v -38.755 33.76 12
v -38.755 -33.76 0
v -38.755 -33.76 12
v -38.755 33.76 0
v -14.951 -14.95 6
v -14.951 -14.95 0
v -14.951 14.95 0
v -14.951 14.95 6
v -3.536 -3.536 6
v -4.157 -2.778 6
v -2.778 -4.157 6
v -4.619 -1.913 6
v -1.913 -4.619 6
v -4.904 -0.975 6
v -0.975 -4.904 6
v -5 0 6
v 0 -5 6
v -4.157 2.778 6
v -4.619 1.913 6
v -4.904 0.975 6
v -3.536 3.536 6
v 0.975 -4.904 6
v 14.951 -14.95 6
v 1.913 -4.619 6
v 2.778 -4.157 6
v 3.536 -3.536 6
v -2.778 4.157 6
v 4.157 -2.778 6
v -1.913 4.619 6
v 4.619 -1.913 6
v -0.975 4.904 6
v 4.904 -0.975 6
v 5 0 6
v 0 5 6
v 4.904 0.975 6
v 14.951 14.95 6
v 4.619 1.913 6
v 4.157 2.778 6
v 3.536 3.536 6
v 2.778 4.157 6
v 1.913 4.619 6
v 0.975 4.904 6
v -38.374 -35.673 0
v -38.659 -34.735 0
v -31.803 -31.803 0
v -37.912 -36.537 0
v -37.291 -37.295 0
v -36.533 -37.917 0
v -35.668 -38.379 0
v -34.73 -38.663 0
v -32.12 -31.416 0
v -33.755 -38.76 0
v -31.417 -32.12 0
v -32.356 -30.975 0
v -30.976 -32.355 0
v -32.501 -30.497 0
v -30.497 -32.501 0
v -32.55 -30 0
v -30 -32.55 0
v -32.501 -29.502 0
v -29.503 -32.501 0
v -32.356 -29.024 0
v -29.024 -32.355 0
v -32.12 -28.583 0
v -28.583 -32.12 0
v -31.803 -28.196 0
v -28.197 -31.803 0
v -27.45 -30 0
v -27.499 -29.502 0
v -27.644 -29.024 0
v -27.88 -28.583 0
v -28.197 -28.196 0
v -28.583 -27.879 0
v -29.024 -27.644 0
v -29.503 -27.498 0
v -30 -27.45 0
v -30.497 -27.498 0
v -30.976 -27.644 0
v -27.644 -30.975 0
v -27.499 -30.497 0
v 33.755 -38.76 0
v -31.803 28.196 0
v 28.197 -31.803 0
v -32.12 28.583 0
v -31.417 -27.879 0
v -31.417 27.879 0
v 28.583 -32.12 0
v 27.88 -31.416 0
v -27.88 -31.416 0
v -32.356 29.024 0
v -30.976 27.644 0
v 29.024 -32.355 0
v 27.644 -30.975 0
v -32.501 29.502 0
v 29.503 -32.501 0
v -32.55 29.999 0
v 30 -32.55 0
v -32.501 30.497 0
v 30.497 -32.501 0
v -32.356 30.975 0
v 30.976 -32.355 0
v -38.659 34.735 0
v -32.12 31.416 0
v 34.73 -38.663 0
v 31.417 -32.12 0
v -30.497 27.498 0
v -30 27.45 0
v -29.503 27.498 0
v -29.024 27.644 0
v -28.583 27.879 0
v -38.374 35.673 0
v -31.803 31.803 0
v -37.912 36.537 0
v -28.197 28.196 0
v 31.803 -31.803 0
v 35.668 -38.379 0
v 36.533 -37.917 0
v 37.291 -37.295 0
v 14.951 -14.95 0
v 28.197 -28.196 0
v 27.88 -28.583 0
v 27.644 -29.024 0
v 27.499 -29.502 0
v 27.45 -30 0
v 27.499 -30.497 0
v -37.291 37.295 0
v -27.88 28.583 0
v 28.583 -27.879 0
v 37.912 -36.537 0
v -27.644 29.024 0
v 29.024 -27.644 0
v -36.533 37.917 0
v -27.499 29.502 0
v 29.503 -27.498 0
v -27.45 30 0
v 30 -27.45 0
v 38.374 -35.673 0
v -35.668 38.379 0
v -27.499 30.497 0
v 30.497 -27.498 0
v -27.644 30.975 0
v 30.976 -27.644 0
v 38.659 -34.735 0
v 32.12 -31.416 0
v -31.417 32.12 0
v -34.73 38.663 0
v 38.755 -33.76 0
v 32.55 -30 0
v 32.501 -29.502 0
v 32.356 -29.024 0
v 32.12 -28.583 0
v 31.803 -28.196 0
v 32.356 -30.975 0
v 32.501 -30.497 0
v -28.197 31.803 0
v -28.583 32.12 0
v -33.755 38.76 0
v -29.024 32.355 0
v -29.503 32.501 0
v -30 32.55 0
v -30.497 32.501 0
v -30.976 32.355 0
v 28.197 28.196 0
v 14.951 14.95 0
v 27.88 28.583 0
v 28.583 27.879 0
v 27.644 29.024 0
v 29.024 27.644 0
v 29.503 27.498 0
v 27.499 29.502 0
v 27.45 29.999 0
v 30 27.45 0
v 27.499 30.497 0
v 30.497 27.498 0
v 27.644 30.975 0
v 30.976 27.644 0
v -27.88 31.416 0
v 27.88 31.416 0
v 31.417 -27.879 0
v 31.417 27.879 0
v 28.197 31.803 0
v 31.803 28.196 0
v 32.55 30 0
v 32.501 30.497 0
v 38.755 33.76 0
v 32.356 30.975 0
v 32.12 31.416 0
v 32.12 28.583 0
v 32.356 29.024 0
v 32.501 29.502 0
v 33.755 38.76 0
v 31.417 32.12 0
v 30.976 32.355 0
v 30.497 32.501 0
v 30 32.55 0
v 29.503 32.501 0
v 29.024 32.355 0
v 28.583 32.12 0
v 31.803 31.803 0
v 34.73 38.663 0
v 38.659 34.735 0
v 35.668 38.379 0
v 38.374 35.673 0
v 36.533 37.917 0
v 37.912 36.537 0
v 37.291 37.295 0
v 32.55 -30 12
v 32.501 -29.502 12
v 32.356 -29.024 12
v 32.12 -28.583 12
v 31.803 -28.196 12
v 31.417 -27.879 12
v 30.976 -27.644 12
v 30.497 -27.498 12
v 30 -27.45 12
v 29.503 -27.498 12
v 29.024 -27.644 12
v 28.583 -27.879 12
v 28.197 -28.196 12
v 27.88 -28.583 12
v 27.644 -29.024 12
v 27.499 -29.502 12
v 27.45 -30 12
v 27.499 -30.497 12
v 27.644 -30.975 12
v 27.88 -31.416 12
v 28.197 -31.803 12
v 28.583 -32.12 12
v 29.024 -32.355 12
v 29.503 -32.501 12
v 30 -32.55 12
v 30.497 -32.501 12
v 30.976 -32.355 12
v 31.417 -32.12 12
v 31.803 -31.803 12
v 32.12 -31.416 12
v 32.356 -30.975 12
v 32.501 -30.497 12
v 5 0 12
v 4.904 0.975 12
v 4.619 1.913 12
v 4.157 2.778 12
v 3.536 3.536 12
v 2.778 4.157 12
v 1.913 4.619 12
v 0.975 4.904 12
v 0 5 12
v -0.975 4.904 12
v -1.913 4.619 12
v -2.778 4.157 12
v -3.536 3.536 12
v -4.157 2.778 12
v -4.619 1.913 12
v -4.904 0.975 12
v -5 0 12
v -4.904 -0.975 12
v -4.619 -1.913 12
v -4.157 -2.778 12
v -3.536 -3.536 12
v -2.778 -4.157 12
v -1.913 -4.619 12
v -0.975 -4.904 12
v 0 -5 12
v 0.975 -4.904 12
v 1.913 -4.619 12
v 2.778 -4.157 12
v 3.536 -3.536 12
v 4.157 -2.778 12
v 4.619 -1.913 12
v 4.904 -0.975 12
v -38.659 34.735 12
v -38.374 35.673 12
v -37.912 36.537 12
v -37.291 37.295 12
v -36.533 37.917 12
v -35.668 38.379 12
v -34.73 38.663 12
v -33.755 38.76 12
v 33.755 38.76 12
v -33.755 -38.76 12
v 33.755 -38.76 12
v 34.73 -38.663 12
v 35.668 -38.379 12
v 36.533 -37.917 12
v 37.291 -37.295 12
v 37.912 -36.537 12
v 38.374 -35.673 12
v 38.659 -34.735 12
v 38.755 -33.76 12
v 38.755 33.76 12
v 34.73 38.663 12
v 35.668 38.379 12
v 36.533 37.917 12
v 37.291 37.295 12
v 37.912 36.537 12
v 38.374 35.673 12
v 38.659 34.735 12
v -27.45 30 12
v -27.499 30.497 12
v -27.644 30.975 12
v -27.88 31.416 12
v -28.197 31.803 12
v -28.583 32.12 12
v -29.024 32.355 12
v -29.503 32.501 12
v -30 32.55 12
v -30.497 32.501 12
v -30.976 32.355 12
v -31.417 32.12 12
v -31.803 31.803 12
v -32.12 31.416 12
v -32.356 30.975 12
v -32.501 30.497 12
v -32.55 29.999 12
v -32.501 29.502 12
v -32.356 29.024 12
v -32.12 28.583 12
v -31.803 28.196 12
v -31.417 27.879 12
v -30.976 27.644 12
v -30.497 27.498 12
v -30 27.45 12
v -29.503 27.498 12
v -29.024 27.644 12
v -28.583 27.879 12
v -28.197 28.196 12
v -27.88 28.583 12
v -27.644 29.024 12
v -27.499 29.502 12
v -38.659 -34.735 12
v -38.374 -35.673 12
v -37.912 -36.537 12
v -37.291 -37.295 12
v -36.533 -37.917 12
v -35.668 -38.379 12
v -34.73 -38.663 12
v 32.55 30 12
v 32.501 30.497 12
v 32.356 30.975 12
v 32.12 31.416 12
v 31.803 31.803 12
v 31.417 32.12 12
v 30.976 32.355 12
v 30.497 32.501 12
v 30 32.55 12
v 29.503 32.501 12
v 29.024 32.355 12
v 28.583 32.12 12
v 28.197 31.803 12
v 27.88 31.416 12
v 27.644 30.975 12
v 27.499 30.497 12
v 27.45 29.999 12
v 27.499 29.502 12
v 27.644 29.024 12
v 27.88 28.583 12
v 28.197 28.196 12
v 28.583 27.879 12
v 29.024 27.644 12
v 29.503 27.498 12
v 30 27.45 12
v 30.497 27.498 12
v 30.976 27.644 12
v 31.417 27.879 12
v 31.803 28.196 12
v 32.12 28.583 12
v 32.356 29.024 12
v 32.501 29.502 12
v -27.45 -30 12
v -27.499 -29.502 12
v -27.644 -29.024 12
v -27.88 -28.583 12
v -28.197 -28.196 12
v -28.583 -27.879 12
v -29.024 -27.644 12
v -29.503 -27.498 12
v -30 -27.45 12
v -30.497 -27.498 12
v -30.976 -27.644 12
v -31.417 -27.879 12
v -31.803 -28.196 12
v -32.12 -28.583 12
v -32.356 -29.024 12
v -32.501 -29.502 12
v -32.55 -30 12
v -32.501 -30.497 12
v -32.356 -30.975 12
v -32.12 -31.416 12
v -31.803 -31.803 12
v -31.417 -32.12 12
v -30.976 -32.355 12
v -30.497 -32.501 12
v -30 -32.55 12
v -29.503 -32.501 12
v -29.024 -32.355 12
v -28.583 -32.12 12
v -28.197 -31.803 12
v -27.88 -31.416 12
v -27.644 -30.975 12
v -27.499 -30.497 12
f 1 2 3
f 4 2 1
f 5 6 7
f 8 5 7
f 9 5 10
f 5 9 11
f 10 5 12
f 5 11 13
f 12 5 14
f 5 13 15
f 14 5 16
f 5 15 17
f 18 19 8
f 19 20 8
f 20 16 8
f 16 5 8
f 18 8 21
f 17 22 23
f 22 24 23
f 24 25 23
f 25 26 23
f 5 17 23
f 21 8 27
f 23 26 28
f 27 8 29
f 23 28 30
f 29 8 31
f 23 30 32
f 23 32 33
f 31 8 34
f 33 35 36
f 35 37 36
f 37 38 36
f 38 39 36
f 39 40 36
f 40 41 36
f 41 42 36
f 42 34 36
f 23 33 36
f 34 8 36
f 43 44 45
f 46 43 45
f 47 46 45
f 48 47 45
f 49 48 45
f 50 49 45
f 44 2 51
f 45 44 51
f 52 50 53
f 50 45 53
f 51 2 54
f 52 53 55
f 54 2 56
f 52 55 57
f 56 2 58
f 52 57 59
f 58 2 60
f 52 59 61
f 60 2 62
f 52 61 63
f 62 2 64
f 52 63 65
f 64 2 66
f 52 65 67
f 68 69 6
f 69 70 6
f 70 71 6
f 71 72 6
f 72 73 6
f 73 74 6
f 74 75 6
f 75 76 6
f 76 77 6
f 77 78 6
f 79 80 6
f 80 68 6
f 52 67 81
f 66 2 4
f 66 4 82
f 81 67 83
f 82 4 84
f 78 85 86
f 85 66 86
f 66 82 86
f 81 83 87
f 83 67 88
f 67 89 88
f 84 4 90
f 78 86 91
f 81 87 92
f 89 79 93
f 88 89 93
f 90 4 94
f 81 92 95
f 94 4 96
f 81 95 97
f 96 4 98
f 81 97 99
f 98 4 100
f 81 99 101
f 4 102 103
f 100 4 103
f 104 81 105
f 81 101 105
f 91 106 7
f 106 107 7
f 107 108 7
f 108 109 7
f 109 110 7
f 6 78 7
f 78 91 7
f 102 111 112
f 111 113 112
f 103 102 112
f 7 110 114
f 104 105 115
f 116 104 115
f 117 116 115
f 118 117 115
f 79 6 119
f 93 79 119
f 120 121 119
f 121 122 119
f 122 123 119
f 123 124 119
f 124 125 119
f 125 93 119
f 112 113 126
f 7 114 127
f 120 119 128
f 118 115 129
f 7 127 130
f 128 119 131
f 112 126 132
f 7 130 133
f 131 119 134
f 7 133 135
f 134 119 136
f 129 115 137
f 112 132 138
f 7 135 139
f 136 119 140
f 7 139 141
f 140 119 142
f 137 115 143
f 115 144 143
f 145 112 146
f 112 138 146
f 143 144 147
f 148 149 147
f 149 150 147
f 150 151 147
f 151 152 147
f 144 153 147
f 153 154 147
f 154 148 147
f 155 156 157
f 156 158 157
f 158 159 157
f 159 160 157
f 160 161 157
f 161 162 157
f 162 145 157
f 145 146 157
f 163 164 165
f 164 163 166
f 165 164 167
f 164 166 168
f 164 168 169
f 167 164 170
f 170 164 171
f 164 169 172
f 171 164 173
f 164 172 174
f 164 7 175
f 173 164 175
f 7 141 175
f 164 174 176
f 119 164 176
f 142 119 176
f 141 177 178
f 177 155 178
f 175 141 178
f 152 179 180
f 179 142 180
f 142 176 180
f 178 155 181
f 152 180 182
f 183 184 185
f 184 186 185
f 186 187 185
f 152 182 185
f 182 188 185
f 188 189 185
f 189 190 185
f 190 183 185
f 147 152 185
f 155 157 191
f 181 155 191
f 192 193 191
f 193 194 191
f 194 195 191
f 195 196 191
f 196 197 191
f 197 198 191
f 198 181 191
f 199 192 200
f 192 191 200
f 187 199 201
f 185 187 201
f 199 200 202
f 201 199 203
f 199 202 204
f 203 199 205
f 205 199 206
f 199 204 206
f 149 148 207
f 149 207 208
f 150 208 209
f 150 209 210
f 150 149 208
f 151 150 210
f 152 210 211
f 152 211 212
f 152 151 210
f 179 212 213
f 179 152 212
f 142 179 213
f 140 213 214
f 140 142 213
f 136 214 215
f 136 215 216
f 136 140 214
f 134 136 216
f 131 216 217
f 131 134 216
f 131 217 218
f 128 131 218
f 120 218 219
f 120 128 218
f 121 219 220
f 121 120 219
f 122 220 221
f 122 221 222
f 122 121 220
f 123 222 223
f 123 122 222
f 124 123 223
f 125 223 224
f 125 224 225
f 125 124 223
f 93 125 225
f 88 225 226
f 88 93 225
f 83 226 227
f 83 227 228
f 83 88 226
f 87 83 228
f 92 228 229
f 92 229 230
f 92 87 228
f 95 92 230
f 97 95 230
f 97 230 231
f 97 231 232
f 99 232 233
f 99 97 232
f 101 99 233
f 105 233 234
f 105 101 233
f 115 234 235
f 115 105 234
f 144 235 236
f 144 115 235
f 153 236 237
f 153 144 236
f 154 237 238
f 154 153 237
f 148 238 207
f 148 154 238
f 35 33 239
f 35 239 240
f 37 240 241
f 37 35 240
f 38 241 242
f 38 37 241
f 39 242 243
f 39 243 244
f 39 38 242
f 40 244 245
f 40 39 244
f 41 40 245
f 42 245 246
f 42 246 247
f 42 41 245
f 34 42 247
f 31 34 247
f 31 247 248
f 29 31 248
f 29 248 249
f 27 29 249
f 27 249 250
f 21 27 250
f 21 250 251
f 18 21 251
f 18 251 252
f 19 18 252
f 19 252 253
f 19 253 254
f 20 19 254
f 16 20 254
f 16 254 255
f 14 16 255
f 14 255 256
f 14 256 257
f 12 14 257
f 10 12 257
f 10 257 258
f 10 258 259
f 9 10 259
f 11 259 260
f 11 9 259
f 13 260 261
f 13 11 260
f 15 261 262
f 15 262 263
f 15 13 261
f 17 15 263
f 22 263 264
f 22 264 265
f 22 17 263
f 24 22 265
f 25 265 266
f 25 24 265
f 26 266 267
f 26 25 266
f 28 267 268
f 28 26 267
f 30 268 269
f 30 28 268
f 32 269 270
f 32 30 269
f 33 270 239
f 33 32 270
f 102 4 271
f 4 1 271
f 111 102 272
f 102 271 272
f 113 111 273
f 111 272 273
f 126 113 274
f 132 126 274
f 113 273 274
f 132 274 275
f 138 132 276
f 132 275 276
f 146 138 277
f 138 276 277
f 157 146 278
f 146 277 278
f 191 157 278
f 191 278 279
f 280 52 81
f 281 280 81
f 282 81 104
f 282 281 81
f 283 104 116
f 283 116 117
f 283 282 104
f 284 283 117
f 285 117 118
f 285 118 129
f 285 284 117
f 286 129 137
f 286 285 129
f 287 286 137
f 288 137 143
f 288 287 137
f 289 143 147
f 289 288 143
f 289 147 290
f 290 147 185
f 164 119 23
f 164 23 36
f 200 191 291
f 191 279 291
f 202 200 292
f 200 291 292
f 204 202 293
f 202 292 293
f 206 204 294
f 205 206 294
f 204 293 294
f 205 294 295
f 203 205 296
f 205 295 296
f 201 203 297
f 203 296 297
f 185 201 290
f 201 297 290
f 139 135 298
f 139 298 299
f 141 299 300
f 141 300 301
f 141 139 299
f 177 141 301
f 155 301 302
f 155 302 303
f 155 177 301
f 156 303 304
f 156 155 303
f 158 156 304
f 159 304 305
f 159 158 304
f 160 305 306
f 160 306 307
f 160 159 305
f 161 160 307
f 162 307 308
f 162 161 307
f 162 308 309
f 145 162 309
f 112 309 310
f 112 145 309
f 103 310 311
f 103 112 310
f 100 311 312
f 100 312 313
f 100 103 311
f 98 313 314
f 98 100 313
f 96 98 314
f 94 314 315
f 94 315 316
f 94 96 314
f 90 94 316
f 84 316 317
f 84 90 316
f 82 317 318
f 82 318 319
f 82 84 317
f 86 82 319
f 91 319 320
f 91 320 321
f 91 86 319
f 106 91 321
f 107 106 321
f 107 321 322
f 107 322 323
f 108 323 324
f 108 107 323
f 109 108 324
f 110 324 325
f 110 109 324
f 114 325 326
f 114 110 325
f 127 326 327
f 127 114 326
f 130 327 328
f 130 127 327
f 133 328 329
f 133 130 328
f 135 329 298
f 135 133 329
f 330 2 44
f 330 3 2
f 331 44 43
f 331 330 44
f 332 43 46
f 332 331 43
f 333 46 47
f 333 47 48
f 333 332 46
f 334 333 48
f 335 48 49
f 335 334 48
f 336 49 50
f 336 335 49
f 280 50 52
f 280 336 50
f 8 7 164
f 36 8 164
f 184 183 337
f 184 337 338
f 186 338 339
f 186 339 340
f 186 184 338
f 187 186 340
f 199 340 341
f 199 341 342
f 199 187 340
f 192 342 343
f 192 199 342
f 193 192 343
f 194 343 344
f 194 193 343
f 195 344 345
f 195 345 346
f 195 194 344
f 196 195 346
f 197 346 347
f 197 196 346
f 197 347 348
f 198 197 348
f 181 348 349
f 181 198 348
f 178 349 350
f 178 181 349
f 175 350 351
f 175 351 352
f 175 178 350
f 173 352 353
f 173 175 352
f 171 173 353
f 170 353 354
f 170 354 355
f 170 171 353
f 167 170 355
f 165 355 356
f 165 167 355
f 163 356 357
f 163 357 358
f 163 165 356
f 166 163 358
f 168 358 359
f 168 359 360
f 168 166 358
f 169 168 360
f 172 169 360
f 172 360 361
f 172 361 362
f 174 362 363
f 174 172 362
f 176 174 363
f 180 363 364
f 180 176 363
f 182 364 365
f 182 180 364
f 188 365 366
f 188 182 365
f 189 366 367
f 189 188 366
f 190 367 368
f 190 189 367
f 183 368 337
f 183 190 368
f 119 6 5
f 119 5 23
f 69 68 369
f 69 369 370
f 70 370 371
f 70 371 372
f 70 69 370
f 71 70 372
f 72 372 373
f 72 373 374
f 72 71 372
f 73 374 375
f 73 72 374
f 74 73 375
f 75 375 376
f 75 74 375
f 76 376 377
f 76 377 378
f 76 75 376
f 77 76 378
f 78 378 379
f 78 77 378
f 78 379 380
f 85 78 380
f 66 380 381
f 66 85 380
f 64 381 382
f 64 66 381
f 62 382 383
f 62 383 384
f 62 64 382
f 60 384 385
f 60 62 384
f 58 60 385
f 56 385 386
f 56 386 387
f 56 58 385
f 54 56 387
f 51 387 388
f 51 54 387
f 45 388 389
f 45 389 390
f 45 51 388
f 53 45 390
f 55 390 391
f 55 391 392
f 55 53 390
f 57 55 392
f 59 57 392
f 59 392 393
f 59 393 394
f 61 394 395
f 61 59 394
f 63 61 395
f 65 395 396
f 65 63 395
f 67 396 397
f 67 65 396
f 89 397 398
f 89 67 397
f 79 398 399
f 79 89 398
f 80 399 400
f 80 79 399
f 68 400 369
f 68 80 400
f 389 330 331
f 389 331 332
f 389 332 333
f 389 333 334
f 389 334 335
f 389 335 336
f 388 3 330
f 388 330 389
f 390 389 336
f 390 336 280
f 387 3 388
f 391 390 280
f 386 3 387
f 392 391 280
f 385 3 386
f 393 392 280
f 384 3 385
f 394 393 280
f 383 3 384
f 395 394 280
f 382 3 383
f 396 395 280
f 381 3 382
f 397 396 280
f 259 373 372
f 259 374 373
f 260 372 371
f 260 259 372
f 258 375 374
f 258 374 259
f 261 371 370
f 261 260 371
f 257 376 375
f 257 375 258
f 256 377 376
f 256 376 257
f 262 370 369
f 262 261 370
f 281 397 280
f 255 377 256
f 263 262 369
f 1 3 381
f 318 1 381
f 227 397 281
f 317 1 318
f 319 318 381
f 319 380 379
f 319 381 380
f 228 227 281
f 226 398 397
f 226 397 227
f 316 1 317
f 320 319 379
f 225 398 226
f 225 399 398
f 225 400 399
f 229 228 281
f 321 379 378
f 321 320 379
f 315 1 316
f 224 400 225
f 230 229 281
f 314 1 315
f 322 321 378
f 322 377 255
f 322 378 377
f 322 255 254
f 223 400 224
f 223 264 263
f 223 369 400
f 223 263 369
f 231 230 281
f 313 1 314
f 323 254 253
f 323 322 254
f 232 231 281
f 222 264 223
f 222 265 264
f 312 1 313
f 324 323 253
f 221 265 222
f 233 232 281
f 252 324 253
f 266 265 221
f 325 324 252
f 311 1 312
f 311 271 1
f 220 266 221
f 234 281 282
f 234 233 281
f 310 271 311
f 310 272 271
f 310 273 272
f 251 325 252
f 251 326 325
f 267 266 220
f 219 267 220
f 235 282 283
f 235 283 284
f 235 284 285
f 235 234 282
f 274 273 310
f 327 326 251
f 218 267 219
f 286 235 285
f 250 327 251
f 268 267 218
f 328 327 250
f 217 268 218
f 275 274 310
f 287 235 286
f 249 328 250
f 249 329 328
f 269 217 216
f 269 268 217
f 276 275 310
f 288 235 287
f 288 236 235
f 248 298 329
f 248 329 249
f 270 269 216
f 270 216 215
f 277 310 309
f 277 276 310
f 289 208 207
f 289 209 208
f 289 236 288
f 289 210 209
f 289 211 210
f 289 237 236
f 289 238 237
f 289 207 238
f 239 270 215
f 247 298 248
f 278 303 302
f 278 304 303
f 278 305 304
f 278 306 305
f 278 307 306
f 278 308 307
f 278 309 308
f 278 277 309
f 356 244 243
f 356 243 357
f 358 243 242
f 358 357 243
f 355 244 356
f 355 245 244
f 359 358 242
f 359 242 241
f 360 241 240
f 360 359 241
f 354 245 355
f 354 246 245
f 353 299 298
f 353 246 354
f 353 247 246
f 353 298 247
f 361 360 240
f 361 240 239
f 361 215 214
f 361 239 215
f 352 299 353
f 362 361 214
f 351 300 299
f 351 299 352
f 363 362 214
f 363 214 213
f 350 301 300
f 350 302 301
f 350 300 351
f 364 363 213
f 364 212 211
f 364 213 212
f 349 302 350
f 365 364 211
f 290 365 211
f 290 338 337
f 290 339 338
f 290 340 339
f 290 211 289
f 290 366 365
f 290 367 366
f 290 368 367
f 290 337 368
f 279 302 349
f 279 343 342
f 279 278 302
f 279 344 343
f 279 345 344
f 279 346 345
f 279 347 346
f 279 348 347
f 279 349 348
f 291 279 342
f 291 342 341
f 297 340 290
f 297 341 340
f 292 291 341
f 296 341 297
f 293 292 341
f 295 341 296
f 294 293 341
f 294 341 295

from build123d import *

# Parameters (mm, degrees)
F0_W     = 77.51
F0_H     = 77.519
F0_R     = 2.55
F0_W_2   = 29.902
F0_H_2   = 29.9
F0_R_2   = 5
F1_DEPTH = 12
F2_DEPTH = 6
F3_R     = 5


with BuildPart() as f1:
    # F0 (on Top) → F1 (new body)
    with BuildSketch(Plane.XY):
        Rectangle(F0_W, F0_H)
        with Locations((-30, -29.9995)):
            Circle(F0_R, mode=Mode.SUBTRACT)
        with Locations((30, -29.9995)):
            Circle(F0_R, mode=Mode.SUBTRACT)
        with Locations((-30, 29.9995)):
            Circle(F0_R, mode=Mode.SUBTRACT)
        Rectangle(F0_W_2, F0_H_2, mode=Mode.SUBTRACT)
        with Locations((30, 29.9995)):
            Circle(F0_R, mode=Mode.SUBTRACT)
        Rectangle(F0_W_2, F0_H_2)
        Circle(F0_R_2, mode=Mode.SUBTRACT)
    extrude(amount=F1_DEPTH)

    # F0 (on Top) → F2 (cut)
    with BuildSketch(Plane.XY):
        Rectangle(F0_W_2, F0_H_2)
        Circle(F0_R_2, mode=Mode.SUBTRACT)
    extrude(amount=F2_DEPTH, mode=Mode.SUBTRACT)

    # F3
    f3_edges = [f1.edges().sort_by_distance(p)[0] for p in [
        (38.755, -38.7595, 6),
        (-38.755, -38.7595, 6),
        (38.755, 38.7595, 6),
        (-38.755, 38.7595, 6),
    ]]
    fillet(f3_edges, radius=F3_R)


solid = f1.part
